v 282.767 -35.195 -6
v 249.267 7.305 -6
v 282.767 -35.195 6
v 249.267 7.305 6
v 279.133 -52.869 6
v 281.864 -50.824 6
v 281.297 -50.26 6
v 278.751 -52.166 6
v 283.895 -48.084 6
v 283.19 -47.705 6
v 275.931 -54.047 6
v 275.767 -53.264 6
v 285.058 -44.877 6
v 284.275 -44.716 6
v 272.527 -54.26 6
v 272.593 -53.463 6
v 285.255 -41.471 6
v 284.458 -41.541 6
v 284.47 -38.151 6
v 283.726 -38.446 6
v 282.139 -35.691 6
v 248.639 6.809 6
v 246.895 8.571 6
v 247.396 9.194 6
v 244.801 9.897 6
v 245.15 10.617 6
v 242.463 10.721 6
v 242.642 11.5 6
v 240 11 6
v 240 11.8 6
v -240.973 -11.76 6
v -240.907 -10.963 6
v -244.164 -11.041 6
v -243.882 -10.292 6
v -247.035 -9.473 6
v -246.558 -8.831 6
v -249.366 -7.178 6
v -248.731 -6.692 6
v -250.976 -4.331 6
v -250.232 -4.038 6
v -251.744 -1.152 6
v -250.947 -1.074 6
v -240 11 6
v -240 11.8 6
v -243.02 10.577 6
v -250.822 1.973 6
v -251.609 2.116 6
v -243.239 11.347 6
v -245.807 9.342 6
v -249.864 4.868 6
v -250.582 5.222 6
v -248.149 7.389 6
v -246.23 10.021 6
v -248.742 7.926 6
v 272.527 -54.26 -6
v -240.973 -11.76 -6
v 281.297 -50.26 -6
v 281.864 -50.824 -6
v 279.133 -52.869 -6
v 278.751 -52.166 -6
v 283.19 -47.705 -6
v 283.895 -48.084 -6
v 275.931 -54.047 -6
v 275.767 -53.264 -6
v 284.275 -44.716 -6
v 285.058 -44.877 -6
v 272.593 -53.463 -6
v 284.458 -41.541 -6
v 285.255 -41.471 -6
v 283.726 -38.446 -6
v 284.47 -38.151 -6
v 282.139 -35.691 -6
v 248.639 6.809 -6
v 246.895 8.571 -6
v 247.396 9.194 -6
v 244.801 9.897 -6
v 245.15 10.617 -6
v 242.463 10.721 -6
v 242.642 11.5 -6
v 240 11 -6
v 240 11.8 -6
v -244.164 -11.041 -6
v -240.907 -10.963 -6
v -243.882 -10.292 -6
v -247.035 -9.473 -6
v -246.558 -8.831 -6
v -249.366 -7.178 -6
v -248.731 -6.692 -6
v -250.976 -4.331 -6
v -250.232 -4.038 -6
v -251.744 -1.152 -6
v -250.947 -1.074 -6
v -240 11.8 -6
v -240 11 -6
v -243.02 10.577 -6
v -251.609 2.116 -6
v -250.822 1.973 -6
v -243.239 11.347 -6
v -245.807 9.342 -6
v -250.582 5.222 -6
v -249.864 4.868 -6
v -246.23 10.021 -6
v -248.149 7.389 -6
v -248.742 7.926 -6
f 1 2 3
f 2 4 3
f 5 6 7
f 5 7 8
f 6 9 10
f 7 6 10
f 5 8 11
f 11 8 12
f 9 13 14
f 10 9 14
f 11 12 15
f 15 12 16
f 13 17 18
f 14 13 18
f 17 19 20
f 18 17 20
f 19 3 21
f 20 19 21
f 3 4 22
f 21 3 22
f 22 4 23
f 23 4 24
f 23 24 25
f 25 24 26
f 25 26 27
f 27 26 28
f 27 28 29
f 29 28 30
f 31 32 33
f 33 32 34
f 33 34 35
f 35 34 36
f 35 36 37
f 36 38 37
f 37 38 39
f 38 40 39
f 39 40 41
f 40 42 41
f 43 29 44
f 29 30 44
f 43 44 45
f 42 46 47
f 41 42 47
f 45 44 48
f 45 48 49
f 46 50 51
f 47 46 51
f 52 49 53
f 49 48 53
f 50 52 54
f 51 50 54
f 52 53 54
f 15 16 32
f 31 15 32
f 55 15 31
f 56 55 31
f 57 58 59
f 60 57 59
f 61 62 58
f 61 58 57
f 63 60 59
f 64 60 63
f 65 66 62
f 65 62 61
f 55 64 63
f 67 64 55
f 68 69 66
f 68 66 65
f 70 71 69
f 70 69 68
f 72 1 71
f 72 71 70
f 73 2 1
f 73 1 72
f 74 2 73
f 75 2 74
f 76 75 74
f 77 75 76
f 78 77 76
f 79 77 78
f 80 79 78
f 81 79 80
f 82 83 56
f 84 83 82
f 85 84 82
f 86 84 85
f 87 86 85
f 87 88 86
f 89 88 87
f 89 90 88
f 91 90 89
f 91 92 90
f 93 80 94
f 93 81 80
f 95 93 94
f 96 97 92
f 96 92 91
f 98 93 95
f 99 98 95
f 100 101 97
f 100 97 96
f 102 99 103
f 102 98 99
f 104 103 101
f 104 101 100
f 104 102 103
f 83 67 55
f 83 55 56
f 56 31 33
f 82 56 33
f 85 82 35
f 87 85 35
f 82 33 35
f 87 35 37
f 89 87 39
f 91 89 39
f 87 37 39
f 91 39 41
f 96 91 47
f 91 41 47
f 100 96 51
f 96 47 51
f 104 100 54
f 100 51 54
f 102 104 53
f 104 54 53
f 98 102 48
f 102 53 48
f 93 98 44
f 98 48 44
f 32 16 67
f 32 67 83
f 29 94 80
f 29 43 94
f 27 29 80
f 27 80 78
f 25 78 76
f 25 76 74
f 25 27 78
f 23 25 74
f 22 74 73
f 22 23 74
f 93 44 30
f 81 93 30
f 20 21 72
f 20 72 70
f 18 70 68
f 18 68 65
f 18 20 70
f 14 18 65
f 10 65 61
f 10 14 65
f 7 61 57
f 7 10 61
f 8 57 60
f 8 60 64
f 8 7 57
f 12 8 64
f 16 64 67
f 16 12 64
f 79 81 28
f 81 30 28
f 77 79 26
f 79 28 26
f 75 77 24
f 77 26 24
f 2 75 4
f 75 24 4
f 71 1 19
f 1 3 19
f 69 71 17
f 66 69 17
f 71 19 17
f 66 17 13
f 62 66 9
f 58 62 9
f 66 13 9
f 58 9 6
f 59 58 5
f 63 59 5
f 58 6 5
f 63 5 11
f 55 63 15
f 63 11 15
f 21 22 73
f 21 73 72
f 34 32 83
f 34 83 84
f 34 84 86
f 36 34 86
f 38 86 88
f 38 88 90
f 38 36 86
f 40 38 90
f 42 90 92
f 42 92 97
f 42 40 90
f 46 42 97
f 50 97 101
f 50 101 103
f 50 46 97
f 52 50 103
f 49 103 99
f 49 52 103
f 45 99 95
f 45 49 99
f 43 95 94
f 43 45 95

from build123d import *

# Parameters (mm, degrees)
LINEAR_AUSTRAGEN_D_NN1_DEPTH = 6


with BuildPart() as part:
    # Skizze1 → Linear-Austragen-Dünn1 (new, symmetric)
    with BuildSketch(Plane.XY):
        with BuildLine():
            Line((-240, 11.8), (240, 11.8))
            ThreePointArc((240, 11.8), (245.149960176, 10.616869133), (249.267195462, 7.304730541))
            Line((249.267195462, 7.304730541), (282.767195462, -35.195269459))
            ThreePointArc((282.767195462, -35.195269459), (283.895246845, -48.083801843), (272.526696959, -54.259790865))
            Line((272.526696959, -54.259790865), (-240.973303041, -11.759790865))
            ThreePointArc((-240.973303041, -11.759790865), (-251.789943431, 0.487066624), (-240, 11.8))
        make_face()
        with BuildLine():
            Line((-240, 11), (240, 11))
            ThreePointArc((240, 11), (244.800810333, 9.897081395), (248.638911024, 6.809494572))
            Line((248.638911024, 6.809494572), (282.138911024, -35.690505428))
            ThreePointArc((282.138911024, -35.690505428), (283.190484347, -47.705239006), (272.592683605, -53.462516908))
            Line((272.592683605, -53.462516908), (-240.907316395, -10.962516908))
            ThreePointArc((-240.907316395, -10.962516908), (-250.990625232, 0.454045158), (-240, 11))
        make_face(mode=Mode.SUBTRACT)
    extrude(amount=LINEAR_AUSTRAGEN_D_NN1_DEPTH, both=True)


solid = part.part
